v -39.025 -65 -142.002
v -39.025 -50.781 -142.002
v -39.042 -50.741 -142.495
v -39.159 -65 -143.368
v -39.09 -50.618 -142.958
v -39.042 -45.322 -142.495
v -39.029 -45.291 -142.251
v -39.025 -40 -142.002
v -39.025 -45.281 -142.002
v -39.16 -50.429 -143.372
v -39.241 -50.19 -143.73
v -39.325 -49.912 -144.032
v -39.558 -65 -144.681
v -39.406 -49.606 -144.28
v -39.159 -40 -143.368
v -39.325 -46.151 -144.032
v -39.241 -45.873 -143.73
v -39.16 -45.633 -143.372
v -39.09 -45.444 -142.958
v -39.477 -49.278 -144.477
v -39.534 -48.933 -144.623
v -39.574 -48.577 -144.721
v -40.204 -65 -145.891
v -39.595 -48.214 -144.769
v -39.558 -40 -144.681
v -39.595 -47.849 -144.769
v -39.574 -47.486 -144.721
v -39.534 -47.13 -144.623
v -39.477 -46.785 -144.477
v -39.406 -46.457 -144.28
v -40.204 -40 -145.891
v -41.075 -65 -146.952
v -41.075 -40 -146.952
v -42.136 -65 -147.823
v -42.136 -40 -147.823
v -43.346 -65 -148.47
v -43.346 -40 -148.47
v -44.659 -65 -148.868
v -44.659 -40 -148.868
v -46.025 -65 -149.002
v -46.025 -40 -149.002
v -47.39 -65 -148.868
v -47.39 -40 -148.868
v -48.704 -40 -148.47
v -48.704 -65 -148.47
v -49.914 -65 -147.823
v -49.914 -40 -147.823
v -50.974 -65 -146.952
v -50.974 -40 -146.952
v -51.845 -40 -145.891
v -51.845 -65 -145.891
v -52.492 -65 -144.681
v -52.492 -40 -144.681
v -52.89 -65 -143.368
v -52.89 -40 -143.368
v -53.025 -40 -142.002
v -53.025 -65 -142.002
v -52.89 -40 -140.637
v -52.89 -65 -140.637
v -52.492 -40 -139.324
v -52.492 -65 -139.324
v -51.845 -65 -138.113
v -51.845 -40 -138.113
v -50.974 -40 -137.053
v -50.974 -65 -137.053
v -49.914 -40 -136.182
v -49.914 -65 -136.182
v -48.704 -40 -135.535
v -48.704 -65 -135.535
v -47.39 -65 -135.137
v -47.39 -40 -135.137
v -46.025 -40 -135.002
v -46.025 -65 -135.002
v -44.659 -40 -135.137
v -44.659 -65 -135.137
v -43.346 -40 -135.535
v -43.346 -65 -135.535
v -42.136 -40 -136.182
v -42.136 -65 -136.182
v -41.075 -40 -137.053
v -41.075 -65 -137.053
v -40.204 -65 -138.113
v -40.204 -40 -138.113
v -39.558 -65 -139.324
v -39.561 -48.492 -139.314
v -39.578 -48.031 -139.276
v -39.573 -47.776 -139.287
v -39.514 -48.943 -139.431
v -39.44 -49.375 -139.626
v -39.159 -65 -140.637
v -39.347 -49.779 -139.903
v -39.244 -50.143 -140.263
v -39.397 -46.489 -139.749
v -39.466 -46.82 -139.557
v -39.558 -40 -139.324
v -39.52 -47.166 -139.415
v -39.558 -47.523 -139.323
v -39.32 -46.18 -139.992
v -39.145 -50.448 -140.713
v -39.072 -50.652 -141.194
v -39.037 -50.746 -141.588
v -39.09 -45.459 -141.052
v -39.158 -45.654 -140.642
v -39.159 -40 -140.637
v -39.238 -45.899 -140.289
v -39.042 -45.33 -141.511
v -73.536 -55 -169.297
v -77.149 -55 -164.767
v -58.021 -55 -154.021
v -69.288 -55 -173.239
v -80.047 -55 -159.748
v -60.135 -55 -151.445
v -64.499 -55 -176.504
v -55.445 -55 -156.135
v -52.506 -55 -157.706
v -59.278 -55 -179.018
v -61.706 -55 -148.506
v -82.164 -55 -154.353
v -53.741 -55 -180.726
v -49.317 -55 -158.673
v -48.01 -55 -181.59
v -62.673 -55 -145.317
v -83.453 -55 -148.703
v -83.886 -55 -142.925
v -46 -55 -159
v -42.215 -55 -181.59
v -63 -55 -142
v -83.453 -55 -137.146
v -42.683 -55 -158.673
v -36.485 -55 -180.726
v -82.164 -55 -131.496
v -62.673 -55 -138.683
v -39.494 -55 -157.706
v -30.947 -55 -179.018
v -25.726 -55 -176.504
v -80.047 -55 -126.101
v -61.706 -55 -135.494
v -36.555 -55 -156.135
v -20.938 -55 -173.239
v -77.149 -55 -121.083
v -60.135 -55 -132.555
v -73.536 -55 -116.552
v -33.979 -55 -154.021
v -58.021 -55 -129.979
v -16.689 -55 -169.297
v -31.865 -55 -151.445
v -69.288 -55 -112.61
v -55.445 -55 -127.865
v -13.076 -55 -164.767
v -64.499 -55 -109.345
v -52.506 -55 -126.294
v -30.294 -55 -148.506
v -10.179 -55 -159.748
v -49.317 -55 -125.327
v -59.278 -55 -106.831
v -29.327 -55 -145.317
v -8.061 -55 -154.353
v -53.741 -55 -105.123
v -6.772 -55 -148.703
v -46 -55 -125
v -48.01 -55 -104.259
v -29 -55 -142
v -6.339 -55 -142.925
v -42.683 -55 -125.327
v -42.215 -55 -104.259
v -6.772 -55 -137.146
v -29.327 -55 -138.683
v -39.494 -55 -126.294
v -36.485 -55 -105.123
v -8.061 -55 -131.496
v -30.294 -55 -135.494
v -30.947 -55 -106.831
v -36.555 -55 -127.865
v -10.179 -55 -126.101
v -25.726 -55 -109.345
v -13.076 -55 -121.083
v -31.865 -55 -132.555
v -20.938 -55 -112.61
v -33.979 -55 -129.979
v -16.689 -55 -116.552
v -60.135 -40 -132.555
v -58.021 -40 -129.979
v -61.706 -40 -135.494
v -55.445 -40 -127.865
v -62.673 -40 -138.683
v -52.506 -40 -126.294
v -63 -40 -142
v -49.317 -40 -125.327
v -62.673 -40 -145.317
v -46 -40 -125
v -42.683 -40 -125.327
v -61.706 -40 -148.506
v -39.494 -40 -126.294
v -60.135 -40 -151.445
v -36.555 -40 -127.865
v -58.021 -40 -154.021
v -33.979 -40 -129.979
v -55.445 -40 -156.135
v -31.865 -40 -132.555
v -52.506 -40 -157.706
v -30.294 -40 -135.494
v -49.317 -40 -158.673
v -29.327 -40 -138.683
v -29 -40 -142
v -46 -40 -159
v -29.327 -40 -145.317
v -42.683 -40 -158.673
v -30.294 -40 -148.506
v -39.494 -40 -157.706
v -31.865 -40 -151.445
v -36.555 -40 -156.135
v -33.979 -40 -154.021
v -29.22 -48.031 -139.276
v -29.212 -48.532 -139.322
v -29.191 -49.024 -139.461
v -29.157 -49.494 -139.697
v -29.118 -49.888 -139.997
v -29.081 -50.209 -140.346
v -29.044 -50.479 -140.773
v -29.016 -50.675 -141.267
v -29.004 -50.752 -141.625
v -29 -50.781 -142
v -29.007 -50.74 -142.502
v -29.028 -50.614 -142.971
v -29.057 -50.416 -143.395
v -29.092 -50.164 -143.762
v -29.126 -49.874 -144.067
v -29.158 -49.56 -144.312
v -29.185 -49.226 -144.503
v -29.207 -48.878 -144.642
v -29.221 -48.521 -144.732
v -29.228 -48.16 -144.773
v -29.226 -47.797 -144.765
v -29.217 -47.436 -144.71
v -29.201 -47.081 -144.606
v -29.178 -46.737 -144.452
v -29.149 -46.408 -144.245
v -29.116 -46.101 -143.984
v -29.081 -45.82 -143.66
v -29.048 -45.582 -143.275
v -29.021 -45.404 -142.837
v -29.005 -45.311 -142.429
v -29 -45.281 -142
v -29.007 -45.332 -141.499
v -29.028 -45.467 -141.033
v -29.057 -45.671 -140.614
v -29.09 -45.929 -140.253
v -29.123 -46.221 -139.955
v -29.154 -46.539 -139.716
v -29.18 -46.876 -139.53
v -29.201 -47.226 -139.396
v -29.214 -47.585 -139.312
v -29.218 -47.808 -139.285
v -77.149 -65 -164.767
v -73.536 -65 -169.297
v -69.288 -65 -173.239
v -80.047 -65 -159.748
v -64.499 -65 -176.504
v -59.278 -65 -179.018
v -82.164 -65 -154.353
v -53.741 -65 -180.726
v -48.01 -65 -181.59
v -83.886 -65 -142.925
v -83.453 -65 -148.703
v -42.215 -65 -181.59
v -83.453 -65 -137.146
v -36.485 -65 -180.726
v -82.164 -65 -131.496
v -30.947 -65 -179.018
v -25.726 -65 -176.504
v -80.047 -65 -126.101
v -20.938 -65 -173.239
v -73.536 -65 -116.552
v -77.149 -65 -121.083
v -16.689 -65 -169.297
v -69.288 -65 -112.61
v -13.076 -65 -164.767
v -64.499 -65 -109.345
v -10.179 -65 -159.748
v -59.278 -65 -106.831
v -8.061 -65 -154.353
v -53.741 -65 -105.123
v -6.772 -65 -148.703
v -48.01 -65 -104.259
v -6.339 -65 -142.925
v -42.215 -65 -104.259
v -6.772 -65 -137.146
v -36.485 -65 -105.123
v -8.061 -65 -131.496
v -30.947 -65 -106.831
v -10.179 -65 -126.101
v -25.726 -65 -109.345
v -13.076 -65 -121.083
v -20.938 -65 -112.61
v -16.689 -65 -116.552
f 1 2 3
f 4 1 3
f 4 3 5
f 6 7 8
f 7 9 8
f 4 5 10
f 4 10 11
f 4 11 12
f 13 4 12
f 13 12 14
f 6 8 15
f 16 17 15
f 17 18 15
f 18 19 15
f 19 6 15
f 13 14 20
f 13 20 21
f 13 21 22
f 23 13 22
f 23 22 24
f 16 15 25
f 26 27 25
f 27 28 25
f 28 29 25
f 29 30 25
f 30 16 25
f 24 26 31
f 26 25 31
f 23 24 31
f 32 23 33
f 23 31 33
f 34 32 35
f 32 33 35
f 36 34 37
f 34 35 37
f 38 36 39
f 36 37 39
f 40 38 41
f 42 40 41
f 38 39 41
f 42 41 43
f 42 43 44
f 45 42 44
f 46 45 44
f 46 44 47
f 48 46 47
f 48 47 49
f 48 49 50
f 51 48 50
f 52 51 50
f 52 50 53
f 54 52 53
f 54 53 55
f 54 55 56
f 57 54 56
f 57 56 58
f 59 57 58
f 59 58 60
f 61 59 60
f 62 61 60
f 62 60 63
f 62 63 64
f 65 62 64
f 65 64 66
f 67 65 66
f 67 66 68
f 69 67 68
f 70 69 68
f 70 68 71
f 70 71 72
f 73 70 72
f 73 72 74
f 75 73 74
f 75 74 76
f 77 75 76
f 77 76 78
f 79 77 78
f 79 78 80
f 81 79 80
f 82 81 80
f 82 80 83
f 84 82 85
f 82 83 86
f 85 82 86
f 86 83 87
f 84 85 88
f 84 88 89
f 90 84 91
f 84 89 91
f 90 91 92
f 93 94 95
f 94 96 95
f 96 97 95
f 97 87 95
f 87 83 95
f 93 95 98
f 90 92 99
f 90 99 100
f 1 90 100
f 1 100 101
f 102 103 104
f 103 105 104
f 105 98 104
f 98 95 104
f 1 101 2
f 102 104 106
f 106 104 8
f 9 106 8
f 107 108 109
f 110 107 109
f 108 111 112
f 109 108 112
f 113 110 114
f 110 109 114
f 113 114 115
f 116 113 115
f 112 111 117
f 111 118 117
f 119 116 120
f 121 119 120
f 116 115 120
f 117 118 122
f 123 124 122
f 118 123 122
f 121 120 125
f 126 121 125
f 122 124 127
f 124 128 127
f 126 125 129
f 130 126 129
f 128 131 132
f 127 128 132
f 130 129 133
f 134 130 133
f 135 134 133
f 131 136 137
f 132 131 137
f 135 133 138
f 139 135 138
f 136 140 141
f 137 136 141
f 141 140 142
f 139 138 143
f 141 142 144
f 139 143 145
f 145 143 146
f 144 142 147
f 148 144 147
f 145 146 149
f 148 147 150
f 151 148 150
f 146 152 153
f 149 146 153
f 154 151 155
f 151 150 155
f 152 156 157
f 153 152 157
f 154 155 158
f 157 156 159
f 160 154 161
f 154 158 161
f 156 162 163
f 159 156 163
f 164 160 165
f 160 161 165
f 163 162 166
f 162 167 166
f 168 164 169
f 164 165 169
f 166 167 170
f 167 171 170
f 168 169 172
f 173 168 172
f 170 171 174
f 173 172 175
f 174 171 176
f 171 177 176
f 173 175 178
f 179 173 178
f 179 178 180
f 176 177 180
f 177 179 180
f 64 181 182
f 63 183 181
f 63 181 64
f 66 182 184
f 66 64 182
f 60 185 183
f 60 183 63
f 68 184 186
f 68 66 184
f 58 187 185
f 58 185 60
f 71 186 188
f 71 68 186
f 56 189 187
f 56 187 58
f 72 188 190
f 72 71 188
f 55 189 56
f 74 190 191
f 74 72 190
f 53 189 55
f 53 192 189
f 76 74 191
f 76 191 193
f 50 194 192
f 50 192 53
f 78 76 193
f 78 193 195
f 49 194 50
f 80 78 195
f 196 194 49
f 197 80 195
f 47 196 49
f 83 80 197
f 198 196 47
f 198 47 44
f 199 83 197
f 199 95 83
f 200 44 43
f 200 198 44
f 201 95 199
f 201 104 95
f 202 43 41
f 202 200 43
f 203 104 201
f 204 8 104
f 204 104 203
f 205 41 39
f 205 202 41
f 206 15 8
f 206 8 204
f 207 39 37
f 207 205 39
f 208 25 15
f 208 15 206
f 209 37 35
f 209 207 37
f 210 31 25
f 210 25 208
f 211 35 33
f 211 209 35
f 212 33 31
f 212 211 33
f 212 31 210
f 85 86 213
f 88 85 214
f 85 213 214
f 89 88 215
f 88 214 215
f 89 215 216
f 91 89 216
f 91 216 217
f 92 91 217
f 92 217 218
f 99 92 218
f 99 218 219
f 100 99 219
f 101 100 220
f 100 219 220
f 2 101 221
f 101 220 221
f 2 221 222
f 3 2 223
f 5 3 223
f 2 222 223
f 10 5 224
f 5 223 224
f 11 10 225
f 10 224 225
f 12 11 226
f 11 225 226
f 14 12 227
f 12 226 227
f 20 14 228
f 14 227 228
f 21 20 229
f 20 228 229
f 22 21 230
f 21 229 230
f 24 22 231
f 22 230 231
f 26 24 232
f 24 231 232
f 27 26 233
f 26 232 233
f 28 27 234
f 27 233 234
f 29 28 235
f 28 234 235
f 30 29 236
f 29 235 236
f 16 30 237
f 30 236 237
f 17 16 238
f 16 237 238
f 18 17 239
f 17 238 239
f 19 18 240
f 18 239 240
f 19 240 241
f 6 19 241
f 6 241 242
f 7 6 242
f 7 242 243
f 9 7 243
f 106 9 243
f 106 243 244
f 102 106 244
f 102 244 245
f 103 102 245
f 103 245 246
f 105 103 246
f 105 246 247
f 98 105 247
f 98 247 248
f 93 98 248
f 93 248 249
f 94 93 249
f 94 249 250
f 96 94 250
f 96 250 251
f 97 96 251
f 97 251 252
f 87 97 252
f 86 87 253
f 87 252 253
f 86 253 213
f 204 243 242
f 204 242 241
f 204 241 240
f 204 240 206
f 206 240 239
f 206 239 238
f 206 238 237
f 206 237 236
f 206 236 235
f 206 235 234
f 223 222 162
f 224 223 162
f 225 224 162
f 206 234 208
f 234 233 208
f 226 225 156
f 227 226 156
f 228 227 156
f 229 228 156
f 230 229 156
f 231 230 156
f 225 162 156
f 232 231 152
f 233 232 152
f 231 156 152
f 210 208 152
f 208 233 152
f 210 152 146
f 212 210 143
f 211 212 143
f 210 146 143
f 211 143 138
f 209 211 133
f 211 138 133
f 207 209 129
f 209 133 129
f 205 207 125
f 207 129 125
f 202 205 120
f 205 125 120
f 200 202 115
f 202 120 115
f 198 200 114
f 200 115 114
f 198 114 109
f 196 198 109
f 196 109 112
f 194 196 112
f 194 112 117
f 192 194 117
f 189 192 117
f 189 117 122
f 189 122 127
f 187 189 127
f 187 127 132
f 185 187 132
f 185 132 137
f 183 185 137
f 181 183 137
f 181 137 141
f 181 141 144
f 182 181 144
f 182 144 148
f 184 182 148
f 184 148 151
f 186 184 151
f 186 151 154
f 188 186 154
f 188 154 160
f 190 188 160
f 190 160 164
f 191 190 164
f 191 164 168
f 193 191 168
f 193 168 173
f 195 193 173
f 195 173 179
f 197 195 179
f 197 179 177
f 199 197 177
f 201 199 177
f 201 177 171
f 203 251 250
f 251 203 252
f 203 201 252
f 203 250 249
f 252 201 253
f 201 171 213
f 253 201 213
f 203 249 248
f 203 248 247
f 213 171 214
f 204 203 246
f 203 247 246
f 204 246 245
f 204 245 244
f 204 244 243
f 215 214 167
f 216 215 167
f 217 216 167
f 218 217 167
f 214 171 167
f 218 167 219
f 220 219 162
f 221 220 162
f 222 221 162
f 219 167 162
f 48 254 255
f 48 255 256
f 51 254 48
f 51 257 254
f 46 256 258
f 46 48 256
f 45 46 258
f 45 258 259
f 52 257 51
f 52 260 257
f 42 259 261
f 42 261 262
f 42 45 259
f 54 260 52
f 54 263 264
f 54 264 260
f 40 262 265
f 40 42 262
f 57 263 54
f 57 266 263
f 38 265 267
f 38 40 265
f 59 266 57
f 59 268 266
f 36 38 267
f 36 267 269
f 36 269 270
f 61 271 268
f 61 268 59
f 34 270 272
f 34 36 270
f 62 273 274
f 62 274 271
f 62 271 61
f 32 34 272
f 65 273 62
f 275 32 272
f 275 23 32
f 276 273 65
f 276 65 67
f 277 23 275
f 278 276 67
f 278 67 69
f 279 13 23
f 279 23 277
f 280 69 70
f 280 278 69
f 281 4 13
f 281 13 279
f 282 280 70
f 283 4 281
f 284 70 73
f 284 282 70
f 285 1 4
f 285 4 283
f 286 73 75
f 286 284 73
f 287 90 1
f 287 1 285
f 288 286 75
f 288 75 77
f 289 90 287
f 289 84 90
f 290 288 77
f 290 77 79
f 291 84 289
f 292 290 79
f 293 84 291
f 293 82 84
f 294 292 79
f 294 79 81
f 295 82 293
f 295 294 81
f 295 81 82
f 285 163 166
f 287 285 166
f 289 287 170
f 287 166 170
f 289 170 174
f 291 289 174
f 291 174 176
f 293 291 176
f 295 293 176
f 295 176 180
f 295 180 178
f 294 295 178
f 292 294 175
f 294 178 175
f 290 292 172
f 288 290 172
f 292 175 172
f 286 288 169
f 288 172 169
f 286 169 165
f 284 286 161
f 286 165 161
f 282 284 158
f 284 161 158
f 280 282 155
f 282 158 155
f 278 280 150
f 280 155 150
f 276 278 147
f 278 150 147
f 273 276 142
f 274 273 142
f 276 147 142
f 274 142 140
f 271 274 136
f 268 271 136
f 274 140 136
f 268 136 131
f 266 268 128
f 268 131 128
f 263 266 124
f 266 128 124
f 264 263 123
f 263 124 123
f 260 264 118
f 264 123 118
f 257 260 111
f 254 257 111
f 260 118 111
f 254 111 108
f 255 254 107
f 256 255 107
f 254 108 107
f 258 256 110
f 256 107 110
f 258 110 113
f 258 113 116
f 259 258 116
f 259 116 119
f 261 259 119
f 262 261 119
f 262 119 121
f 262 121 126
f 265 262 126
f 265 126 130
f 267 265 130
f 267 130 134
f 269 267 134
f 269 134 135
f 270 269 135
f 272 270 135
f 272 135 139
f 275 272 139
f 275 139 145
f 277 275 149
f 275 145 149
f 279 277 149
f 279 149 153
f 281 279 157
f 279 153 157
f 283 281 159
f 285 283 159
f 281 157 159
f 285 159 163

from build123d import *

# Parameters (mm, degrees)
SKETCH021_R             = 38.773757
PAD011_DEPTH            = 10
SKETCH024_R             = 17
PAD012_DEPTH            = 15
SKETCH023_R             = 7
HOLE007_DEPTH           = 33
SKETCH022_R             = 2.75
HOLE008_DEPTH           = 41.347633
HOLE008_TIPS_R          = 2.75
BODY010_PLACEMENT_ANGLE = 90


with BuildPart() as part:
    # Sketch021 → Pad011 (new body)
    with BuildSketch(Plane.XY):
        with Locations((-46.112587, 35.075455)):
            Circle(SKETCH021_R)
    extrude(amount=PAD011_DEPTH)

    # Sketch024 (on Face2 of Pad011) → Pad012 (join)
    with BuildSketch(Plane(origin=(0, 0, 0), x_dir=(1, 0, 0), z_dir=(0, 0, -1))):
        with Locations((-47, -36)):
            Circle(SKETCH024_R)
    extrude(amount=PAD012_DEPTH)

    # Sketch023 (on Face5 of Pad012) → Hole007 (cut)
    with BuildSketch(Plane(origin=(0, 0, -15), x_dir=(1, 0, 0), z_dir=(0, 0, -1))):
        with Locations((-47.024734, -35.997555)):
            Circle(SKETCH023_R)
    extrude(amount=-HOLE007_DEPTH, mode=Mode.SUBTRACT)

    # Sketch022 → Hole008 (cut)
    with BuildSketch(Plane.YZ):
        with Locations((35.974483, -6.968689)):
            Circle(SKETCH022_R)
    extrude(amount=-HOLE008_DEPTH, mode=Mode.SUBTRACT)

    # Hole008 tips → Hole008 tip 1 section 0
    with BuildSketch(Plane.YZ.offset(-41.347633), mode=Mode.PRIVATE) as hole008_tip_1_s0:
        with Locations((35.974483, -6.968689)):
            Circle(HOLE008_TIPS_R)
    loft([hole008_tip_1_s0.sketch, Vertex(-43, 35.974483, -6.968689)], mode=Mode.SUBTRACT)


with BuildPart() as part_1:
    # Body010 placement: moved
    add(part.part.moved(Location((1, -55, -178))).rotate(Axis((1, -55, -178), (1, 0, 0)), BODY010_PLACEMENT_ANGLE))


solid = part_1.part
